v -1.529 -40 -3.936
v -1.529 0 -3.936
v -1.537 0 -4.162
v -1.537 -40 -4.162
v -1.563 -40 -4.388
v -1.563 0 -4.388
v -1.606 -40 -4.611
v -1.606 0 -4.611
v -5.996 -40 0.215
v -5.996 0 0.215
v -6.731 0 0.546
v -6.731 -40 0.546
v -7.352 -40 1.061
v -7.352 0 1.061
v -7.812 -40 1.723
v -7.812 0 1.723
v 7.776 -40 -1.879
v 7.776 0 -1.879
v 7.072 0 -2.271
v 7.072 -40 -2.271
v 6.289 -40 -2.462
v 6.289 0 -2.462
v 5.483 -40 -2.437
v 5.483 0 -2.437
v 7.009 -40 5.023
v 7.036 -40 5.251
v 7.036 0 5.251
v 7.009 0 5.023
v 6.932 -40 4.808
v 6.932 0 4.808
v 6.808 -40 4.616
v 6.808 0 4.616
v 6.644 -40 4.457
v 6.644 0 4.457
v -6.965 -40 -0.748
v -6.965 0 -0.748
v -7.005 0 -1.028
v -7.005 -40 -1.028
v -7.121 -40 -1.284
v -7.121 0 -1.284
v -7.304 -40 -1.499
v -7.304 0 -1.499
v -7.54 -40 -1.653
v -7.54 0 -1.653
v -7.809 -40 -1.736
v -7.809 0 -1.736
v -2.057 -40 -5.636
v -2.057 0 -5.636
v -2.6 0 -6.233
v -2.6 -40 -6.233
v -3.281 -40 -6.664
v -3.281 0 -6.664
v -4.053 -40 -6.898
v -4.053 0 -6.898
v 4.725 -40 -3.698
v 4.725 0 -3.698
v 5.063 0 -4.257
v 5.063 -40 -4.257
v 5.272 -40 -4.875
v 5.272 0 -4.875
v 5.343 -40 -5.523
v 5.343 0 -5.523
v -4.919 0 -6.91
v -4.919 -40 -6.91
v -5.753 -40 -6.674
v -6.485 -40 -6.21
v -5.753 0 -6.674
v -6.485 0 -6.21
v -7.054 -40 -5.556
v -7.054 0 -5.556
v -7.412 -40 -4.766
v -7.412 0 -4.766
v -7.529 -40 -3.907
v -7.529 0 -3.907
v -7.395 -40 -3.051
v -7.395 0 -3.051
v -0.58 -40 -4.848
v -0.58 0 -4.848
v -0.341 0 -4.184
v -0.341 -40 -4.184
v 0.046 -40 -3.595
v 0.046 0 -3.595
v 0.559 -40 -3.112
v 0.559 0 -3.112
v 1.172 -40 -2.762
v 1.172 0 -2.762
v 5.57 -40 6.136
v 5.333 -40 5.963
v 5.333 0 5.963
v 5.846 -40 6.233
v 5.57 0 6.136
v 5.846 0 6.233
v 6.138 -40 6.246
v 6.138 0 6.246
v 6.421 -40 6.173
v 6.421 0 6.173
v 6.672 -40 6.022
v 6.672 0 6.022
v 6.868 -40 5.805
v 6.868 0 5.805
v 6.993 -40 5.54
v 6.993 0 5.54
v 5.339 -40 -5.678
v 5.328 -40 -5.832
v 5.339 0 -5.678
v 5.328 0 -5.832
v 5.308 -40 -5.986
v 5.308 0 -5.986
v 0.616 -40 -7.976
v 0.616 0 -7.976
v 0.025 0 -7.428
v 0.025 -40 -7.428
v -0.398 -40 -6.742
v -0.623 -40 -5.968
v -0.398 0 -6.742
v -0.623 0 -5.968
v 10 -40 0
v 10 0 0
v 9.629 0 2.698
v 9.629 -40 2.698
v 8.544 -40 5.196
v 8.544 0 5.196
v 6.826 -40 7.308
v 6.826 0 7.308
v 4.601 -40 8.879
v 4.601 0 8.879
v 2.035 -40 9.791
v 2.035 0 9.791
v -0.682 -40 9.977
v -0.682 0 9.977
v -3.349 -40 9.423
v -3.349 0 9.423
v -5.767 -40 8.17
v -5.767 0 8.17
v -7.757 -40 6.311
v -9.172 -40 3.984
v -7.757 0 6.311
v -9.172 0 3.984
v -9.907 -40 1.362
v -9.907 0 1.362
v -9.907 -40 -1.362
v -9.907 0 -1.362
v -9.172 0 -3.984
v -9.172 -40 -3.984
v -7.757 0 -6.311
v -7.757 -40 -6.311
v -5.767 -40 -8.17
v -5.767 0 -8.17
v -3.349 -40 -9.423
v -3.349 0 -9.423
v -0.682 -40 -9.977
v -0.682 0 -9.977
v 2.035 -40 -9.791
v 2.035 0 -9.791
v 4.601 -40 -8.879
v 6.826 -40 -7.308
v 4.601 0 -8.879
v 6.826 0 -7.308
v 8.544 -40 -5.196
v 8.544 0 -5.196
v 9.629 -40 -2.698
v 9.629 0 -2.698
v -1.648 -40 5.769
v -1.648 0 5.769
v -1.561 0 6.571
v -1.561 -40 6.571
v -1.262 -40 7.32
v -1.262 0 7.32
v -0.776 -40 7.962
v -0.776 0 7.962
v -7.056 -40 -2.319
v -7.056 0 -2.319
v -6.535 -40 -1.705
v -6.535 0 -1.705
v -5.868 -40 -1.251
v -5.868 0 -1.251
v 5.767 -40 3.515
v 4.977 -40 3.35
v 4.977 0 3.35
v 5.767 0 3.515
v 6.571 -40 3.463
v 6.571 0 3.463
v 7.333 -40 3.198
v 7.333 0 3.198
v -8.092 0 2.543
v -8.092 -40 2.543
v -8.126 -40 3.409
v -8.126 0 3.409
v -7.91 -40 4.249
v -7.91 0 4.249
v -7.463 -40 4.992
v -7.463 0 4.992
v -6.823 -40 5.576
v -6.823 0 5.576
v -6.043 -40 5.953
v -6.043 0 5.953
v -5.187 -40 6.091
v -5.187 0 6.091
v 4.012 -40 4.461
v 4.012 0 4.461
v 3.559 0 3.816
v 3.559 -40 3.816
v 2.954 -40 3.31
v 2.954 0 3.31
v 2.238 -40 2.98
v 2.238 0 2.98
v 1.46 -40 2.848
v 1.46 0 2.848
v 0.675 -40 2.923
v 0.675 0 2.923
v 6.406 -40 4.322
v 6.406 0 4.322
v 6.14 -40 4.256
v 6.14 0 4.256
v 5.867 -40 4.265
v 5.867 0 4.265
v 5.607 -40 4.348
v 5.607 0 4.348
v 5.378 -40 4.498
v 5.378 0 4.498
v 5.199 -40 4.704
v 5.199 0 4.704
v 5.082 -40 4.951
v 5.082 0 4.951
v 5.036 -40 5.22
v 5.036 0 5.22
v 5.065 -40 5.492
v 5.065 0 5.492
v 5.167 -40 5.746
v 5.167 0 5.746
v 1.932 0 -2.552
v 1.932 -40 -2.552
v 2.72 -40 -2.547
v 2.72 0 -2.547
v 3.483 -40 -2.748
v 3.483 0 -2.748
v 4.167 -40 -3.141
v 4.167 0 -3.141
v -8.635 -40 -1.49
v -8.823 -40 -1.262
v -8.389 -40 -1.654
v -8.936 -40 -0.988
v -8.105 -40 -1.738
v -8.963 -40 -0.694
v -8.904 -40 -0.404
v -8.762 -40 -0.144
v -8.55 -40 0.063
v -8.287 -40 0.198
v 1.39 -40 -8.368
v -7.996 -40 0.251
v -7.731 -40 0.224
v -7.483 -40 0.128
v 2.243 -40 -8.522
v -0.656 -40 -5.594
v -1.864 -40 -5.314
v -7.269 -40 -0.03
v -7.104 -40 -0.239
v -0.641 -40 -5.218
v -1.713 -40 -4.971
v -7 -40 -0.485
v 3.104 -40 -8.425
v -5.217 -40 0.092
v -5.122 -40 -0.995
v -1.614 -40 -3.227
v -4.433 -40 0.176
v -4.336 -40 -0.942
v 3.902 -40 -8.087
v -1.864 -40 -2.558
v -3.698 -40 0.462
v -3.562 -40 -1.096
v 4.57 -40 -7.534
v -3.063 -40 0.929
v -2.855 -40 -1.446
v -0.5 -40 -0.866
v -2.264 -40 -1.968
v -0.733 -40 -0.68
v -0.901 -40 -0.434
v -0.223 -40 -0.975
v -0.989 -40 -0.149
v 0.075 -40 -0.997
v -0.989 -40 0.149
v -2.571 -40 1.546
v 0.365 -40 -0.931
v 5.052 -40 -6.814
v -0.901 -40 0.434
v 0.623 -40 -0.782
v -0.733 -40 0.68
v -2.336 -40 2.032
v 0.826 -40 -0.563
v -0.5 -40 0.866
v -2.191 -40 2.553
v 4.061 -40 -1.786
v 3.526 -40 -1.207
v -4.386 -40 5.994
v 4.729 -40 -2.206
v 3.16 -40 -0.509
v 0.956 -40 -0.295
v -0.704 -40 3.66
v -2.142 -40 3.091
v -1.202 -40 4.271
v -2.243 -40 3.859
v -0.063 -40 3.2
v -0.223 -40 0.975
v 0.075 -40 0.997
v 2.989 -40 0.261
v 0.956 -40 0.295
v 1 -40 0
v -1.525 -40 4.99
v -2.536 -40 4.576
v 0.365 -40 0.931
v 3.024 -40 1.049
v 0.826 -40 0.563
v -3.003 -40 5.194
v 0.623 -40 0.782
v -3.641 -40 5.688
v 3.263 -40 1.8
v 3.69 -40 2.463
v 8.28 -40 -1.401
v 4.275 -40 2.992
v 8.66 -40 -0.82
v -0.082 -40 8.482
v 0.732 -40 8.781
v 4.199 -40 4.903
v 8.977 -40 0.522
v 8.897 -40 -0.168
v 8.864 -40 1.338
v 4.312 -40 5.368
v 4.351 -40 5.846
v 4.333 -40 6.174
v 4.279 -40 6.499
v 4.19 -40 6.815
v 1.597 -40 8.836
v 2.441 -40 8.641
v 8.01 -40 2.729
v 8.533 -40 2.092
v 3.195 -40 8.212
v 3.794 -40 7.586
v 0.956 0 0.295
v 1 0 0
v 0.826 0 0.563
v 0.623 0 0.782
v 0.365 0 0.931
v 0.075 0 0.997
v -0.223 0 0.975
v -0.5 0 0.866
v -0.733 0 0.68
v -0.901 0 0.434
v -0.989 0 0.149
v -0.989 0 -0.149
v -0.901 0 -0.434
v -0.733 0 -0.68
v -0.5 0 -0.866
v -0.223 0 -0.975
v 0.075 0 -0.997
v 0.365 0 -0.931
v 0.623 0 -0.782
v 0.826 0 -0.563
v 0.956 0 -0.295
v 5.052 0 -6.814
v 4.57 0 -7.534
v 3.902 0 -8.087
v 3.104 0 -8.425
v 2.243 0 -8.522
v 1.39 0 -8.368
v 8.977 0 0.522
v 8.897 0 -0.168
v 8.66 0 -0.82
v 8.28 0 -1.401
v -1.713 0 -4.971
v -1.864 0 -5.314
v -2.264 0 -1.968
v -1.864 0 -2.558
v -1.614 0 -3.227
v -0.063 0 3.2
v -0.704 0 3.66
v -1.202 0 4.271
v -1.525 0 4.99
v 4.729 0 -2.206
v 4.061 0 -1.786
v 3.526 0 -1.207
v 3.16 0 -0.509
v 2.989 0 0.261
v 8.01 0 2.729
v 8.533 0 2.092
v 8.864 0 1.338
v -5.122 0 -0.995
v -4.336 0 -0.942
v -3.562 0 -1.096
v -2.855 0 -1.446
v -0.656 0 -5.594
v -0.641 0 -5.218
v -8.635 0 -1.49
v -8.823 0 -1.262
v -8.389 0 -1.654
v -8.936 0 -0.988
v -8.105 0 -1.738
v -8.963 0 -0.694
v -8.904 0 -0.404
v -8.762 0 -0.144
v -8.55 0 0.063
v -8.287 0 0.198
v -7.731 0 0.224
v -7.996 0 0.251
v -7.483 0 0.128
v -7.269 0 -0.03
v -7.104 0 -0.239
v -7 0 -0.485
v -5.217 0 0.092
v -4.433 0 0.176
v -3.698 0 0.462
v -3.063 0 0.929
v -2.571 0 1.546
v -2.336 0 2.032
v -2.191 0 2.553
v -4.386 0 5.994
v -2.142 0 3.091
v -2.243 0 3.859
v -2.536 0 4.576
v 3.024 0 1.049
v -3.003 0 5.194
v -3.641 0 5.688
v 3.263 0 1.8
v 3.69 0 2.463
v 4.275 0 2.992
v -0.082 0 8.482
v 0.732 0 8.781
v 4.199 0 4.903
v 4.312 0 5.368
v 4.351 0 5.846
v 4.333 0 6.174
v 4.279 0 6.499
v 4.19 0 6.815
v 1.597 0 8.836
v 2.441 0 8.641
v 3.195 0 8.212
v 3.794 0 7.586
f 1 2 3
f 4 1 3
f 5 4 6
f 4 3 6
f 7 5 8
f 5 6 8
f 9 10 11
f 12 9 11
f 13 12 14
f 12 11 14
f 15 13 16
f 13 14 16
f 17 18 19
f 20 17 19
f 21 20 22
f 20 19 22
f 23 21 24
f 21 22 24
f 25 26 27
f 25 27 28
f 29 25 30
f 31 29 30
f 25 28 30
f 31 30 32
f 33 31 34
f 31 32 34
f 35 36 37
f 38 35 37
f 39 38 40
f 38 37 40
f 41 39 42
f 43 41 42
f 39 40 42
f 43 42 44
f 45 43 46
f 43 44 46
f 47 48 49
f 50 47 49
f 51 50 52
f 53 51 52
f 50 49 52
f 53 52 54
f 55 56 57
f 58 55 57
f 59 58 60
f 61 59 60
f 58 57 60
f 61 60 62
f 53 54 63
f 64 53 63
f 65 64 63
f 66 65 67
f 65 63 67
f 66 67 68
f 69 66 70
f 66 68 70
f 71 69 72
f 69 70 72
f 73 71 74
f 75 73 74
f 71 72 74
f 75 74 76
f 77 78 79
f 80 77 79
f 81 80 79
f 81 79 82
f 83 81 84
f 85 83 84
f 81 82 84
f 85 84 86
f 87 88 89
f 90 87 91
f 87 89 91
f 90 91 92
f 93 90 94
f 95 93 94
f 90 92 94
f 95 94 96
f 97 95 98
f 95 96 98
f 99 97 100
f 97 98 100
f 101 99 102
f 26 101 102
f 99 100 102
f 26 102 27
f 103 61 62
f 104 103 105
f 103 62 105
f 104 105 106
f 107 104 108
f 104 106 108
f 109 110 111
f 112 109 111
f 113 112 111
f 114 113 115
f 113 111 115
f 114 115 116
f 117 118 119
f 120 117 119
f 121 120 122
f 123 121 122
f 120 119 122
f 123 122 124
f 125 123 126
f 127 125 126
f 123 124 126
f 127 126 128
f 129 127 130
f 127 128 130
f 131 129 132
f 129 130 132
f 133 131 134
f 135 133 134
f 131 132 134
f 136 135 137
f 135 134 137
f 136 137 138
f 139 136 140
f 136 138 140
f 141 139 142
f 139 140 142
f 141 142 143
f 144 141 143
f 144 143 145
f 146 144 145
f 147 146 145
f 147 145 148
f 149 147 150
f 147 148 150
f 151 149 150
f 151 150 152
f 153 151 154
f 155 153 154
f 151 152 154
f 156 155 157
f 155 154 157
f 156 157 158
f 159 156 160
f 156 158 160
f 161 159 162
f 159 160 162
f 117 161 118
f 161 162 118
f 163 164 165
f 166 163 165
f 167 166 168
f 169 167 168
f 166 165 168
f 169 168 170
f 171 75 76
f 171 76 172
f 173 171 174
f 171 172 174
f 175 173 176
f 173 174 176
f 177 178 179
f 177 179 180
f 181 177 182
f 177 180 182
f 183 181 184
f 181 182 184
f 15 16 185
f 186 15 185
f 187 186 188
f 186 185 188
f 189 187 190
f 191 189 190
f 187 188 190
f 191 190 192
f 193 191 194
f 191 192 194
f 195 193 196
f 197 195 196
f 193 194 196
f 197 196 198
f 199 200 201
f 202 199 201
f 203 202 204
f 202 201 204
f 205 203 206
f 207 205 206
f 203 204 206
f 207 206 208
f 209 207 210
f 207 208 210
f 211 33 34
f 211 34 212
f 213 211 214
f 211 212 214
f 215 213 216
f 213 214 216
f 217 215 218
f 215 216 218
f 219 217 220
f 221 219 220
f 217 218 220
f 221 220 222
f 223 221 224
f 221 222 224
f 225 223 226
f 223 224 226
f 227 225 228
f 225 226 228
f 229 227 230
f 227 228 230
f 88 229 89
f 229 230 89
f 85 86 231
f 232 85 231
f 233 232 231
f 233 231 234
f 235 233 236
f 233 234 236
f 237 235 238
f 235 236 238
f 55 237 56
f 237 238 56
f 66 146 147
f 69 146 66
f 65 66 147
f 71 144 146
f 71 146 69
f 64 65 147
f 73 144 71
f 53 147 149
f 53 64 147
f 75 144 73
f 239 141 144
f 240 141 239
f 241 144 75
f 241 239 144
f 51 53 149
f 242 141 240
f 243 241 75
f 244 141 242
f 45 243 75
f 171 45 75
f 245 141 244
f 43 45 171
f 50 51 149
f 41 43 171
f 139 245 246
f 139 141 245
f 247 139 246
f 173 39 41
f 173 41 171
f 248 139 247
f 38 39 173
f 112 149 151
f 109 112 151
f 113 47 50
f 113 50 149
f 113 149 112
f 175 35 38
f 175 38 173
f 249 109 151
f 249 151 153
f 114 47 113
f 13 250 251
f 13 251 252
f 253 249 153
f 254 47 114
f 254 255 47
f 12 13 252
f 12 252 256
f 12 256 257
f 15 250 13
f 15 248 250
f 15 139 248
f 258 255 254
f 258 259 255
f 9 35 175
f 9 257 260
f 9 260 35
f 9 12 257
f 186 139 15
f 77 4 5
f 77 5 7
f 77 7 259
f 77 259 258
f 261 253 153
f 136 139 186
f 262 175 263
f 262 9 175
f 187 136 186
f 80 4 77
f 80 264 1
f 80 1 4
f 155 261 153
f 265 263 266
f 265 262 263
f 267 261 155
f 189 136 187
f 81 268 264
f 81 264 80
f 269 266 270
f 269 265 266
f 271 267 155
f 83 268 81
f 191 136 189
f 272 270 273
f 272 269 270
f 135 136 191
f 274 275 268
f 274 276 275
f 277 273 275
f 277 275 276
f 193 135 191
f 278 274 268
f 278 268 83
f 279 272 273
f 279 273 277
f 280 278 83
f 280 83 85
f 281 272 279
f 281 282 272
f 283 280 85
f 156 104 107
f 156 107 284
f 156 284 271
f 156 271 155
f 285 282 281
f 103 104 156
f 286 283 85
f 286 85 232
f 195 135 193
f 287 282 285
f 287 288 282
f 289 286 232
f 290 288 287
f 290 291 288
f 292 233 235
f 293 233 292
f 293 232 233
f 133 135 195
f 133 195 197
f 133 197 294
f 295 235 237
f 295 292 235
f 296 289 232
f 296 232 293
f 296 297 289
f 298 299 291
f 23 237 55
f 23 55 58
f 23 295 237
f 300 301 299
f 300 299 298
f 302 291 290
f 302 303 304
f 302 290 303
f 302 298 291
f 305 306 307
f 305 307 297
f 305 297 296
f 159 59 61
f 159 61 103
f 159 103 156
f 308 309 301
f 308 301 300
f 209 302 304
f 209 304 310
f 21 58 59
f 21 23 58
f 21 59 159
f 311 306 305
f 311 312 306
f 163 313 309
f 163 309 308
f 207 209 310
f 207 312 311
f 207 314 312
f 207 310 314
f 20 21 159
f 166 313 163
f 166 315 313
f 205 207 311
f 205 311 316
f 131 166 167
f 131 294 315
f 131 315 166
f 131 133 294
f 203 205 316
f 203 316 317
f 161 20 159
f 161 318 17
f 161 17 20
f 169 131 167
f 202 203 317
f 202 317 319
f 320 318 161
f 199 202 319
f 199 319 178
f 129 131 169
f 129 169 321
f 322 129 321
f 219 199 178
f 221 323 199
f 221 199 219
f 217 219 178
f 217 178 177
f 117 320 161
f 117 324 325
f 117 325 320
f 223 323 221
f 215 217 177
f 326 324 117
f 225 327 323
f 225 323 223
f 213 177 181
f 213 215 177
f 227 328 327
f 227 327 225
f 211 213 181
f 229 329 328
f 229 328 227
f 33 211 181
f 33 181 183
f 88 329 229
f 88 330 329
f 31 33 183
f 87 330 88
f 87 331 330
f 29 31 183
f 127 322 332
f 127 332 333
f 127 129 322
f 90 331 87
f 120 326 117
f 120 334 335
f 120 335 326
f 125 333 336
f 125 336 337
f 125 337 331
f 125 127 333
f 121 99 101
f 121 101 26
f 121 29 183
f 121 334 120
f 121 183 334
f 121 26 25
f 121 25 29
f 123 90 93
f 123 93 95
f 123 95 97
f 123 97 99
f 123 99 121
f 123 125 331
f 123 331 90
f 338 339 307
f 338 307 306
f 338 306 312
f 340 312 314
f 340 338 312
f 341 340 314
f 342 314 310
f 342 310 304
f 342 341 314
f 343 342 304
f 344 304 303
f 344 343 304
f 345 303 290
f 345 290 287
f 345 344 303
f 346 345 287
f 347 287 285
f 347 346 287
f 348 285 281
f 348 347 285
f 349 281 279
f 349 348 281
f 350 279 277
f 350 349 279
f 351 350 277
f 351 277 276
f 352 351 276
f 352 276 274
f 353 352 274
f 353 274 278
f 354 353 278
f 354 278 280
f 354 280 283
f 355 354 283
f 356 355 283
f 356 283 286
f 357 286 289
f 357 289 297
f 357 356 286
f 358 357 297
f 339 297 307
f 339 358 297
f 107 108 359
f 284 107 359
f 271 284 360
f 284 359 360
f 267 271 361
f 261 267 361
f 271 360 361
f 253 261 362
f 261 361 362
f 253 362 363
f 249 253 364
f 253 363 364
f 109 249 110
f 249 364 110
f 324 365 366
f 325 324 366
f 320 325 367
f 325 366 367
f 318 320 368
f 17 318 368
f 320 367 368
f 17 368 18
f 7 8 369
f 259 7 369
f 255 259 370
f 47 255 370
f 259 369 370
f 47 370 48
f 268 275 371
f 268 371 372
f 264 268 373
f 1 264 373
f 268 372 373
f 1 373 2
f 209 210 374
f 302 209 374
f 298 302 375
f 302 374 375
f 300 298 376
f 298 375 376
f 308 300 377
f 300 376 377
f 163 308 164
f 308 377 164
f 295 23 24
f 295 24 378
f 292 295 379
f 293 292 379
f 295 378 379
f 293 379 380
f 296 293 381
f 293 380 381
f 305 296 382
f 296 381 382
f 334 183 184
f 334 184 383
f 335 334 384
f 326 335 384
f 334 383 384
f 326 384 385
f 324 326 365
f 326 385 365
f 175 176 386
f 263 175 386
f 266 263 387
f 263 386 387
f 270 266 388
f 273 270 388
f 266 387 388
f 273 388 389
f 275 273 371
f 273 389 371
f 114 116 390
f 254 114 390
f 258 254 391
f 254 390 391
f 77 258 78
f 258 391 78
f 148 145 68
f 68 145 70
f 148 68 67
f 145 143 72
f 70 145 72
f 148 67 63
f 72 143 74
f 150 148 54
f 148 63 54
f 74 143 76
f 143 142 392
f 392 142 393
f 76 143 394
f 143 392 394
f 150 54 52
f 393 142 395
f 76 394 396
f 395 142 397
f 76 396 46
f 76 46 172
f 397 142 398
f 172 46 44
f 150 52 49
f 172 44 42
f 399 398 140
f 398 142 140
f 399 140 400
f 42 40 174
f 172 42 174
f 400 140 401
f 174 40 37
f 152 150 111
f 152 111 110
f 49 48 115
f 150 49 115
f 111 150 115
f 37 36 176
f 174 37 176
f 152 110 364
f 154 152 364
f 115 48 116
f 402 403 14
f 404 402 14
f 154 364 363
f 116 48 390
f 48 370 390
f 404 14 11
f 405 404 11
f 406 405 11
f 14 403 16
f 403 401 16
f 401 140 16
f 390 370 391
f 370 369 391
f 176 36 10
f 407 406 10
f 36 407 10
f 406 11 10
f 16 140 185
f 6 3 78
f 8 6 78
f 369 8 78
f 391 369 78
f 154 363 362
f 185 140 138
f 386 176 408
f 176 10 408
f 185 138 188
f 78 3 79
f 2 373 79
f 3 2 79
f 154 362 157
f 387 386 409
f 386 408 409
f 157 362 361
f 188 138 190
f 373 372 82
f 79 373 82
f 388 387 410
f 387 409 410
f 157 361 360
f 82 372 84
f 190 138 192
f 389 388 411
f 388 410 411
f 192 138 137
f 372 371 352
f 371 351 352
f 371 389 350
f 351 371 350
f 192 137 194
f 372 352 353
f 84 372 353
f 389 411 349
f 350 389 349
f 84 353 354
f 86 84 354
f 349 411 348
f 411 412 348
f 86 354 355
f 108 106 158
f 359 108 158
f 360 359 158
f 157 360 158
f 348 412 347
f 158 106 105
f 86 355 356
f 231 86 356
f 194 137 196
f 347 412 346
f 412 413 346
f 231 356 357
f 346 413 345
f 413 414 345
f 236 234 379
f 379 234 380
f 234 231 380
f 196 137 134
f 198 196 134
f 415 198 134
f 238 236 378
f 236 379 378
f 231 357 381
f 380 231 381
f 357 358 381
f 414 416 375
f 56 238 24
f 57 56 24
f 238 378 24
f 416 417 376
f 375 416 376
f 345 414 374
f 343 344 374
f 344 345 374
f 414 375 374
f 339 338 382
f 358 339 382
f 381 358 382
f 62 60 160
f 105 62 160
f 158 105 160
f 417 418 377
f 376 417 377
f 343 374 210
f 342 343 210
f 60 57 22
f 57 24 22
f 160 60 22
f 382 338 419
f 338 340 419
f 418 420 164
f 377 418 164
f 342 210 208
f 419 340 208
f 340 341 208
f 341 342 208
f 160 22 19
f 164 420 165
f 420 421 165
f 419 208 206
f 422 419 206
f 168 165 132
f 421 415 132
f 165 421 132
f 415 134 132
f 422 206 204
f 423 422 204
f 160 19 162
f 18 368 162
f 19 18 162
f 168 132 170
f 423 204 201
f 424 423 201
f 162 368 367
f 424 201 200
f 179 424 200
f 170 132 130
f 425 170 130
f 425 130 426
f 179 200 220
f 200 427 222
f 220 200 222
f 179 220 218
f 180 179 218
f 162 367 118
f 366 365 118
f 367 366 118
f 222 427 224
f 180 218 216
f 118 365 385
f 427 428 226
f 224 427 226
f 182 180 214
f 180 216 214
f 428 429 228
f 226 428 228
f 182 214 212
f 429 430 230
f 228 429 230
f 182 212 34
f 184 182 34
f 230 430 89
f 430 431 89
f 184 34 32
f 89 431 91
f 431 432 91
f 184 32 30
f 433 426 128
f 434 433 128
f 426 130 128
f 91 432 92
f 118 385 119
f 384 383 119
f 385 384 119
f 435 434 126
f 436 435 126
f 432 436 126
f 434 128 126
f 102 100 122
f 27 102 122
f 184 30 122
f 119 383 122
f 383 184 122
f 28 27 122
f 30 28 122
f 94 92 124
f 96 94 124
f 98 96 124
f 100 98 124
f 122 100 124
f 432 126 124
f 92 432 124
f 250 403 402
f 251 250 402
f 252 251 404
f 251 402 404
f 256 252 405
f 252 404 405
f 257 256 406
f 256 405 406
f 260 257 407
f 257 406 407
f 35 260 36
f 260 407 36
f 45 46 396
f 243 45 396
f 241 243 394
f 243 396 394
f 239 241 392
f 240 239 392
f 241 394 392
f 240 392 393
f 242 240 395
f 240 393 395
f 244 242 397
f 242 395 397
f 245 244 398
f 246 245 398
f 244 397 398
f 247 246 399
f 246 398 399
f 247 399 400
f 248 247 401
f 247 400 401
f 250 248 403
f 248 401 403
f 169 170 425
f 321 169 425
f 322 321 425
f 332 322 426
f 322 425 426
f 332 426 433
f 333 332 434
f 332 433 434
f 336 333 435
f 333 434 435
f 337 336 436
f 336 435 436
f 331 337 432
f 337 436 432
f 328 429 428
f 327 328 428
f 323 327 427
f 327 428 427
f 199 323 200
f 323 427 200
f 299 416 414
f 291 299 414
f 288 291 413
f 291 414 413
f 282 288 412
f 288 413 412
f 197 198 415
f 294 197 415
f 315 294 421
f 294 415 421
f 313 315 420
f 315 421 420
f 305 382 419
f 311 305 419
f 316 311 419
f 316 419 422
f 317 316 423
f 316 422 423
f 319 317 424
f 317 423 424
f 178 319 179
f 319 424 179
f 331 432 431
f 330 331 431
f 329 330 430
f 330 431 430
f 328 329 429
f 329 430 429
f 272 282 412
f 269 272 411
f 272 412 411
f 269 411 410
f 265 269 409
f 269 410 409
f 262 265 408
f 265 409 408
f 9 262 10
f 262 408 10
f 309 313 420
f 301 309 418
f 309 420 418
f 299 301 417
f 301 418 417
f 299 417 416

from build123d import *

# Parameters (mm, degrees)
F0_R     = 10
F0_R_2   = 1
F1_DEPTH = 40


with BuildPart() as f1:
    # F0 (on Front) → F1 (new body)
    with BuildSketch(Plane.XZ):
        Circle(F0_R)
        with BuildLine():
            ThreePointArc((6.6435448727, 4.4568275179), (7.0165111824, 3.8429898293), (7.3329177707, 3.1981740052))
            ThreePointArc((7.3329177707, 3.1981740052), (8.5333245383, 2.0924606947), (8.9772542605, 0.5219497159))
            ThreePointArc((8.9772542605, 0.5219497159), (8.6602558801, -0.8202508315), (7.776252721, -1.8788011123))
            ThreePointArc((7.776252721, -1.8788011123), (6.8566594958, -4.1214342842), (5.3076404374, -5.9857291107))
            ThreePointArc((5.3076404374, -5.9857291107), (3.5152152369, -8.2851229223), (0.6161482026, -7.9762372954))
            ThreePointArc((0.6161482026, -7.9762372954), (-1.8008926237, -7.7946639285), (-4.0526155804, -6.8975580431))
            ThreePointArc((-4.0526155804, -6.8975580431), (-6.7933588965, -5.9034121407), (-7.3954521896, -3.0507846385))
            ThreePointArc((-7.3954521896, -3.0507846385), (-7.630756176, -2.4024071642), (-7.8093348718, -1.7361707463))
            ThreePointArc((-7.8093348718, -1.7361707463), (-8.9605366896, -0.8418920566), (-7.9960562334, 0.251166702))
            ThreePointArc((-7.9960562334, 0.251166702), (-7.9383510901, 0.9912527276), (-7.8122946094, 1.7228038007))
            ThreePointArc((-7.8122946094, 1.7228038007), (-7.7137419327, 4.6366135697), (-5.186789018, 6.0907486964))
            ThreePointArc((-5.186789018, 6.0907486964), (-3.1246357662, 7.3645537087), (-0.7756480184, 7.9623093479))
            ThreePointArc((-0.7756480184, 7.9623093479), (2.0260042016, 8.7689969195), (4.189840284, 6.8150743499))
            ThreePointArc((4.189840284, 6.8150743499), (4.7806533049, 6.4144644343), (5.3334042334, 5.9627845243))
            ThreePointArc((5.3334042334, 5.9627845243), (6.4214881928, 6.1733853396), (7.035627896, 5.2508281158))
            ThreePointArc((7.035627896, 5.2508281158), (6.9322652186, 4.8080623632), (6.6435448727, 4.4568275179))
        make_face(mode=Mode.SUBTRACT)
        with BuildLine():
            ThreePointArc((-2.5712473173, 1.5455378459), (-1.1717384371, 2.7617076302), (0.6753346935, 2.9229989825))
            ThreePointArc((0.6753346935, 2.9229989825), (-0.9731935316, 3.9487207499), (-1.6483458018, 5.7691382474))
            ThreePointArc((-1.6483458018, 5.7691382474), (-2.3434768246, 5.5234152815), (-3.0032221992, 5.1942907526))
            ThreePointArc((-3.0032221992, 5.1942907526), (-2.3660024763, 4.2273377279), (-2.1424946218, 3.0910757132))
            ThreePointArc((-2.1424946218, 3.0910757132), (-2.2516693146, 2.2891224456), (-2.5712473173, 1.5455378459))
        make_face()
        with BuildLine():
            ThreePointArc((0.6753346935, 2.9229989825), (2.2644529469, 1.9678040683), (2.9886271289, 0.2609748731))
            ThreePointArc((2.9886271289, 0.2609748731), (3.454723253, 2.1457838566), (4.9774096583, 3.3504317772))
            ThreePointArc((4.9774096583, 3.3504317772), (4.528905931, 3.9356080938), (4.0120173703, 4.4613581587))
            ThreePointArc((4.0120173703, 4.4613581587), (2.6067344642, 3.1216079734), (0.6753346935, 2.9229989825))
        make_face()
        with BuildLine():
            ThreePointArc((2.9886271289, 0.2609748731), (2.9971554336, 0.1306112807), (3, 0))
            ThreePointArc((3, 0), (2.5015210631, -1.6560170201), (1.1717384193, -2.7617076378))
            ThreePointArc((1.1717384193, -2.7617076378), (3.1083299118, -2.6225533829), (4.7245541465, -3.6984575321))
            ThreePointArc((4.7245541465, -3.6984575321), (5.1424946218, -3.0910757132), (5.4827852975, -2.4370197745))
            ThreePointArc((5.4827852975, -2.4370197745), (3.7743508626, -1.5145218945), (2.9886271289, 0.2609748731))
        make_face()
        with BuildLine():
            ThreePointArc((-0.5795221486, -4.8480805477), (0.0456612251, -3.5946738602), (1.1717384193, -2.7617076378))
            ThreePointArc((1.1717384193, -2.7617076378), (-0.675334733, -2.9229989734), (-2.2644529693, -1.9678040425))
            ThreePointArc((-2.2644529693, -1.9678040425), (-1.7188028292, -2.8852174249), (-1.528905931, -3.9356080938))
            ThreePointArc((-1.528905931, -3.9356080938), (-1.5482183493, -4.2754632692), (-1.6059069578, -4.6109428277))
            Line((-1.6059069578, -4.6109428277), (-0.5795221486, -4.8480805477))
        make_face()
        with BuildLine():
            ThreePointArc((-0.6234697034, -5.9675192106), (-0.654213992, -5.4057302436), (-0.5795221486, -4.8480805477))
            Line((-0.5795221486, -4.8480805477), (-1.6059069578, -4.6109428277))
            ThreePointArc((-1.6059069578, -4.6109428277), (-1.783407838, -5.1448393461), (-2.057474614, -5.636204238))
            ThreePointArc((-2.057474614, -5.636204238), (-1.3506694677, -5.8459979464), (-0.6234697034, -5.9675192106))
        make_face()
        with BuildLine():
            ThreePointArc((0.6161482026, -7.9762372954), (-0.2095198229, -7.0989177785), (-0.6234697034, -5.9675192106))
            ThreePointArc((-0.6234697034, -5.9675192106), (-1.3506694677, -5.8459979464), (-2.057474614, -5.636204238))
            ThreePointArc((-2.057474614, -5.636204238), (-2.9257780157, -6.4713487918), (-4.0526155804, -6.8975580431))
            ThreePointArc((-4.0526155804, -6.8975580431), (-1.8008926237, -7.7946639285), (0.6161482026, -7.9762372954))
        make_face()
        with BuildLine():
            ThreePointArc((-5.8681107652, -1.2511099262), (-3.9437276347, -0.993233821), (-2.2644529693, -1.9678040425))
            ThreePointArc((-2.2644529693, -1.9678040425), (-2.9886271299, -0.2609748613), (-2.5712473173, 1.5455378459))
            ThreePointArc((-2.5712473173, 1.5455378459), (-4.0561899268, 0.2946597731), (-5.996143389, 0.2150917455))
            ThreePointArc((-5.996143389, 0.2150917455), (-5.9772542605, -0.5219497159), (-5.8681107652, -1.2511099262))
        make_face()
        with BuildLine():
            ThreePointArc((-7.3954521896, -3.0507846385), (-6.8162171978, -1.9944210424), (-5.8681107652, -1.2511099262))
            ThreePointArc((-5.8681107652, -1.2511099262), (-5.9772542605, -0.5219497159), (-5.996143389, 0.2150917455))
            ThreePointArc((-5.996143389, 0.2150917455), (-7.0587335663, 0.7828234939), (-7.8122946094, 1.7228038007))
            ThreePointArc((-7.8122946094, 1.7228038007), (-7.9383510901, 0.9912527276), (-7.9960562334, 0.251166702))
            ThreePointArc((-7.9960562334, 0.251166702), (-7.2689095521, -0.0303182964), (-6.9649215018, -0.7483484948))
            ThreePointArc((-6.9649215018, -0.7483484948), (-7.2047943315, -1.3981228287), (-7.8093348718, -1.7361707463))
            ThreePointArc((-7.8093348718, -1.7361707463), (-7.630756176, -2.4024071642), (-7.3954521896, -3.0507846385))
        make_face()
        with BuildLine():
            ThreePointArc((7.776252721, -1.8788011123), (6.686726826, -2.3929514281), (5.4827852975, -2.4370197745))
            ThreePointArc((5.4827852975, -2.4370197745), (5.1424946218, -3.0910757132), (4.7245541465, -3.6984575321))
            ThreePointArc((4.7245541465, -3.6984575321), (5.1845357791, -4.5598884178), (5.3434768246, -5.5234152815))
            ThreePointArc((5.3434768246, -5.5234152815), (5.3345043101, -5.755265623), (5.3076404374, -5.9857291107))
            ThreePointArc((5.3076404374, -5.9857291107), (6.8566594958, -4.1214342842), (7.776252721, -1.8788011123))
        make_face()
        with BuildLine():
            ThreePointArc((4.0120173703, 4.4613581587), (4.528905931, 3.9356080938), (4.9774096583, 3.3504317772))
            ThreePointArc((4.9774096583, 3.3504317772), (6.1707675187, 3.51570198), (7.3329177707, 3.1981740052))
            ThreePointArc((7.3329177707, 3.1981740052), (7.0165111824, 3.8429898293), (6.6435448727, 4.4568275179))
            ThreePointArc((6.6435448727, 4.4568275179), (5.281174409, 4.5944746013), (5.3334042334, 5.9627845243))
            ThreePointArc((5.3334042334, 5.9627845243), (4.7806533049, 6.4144644343), (4.189840284, 6.8150743499))
            ThreePointArc((4.189840284, 6.8150743499), (4.3101890613, 6.3371636776), (4.3506694677, 5.8459979464))
            ThreePointArc((4.3506694677, 5.8459979464), (4.2647768532, 5.1332720901), (4.0120173703, 4.4613581587))
        make_face()
        with BuildLine():
            ThreePointArc((1.1717384193, -2.7617076378), (2.5015210631, -1.6560170201), (3, 0))
            ThreePointArc((3, 0), (2.9971554336, 0.1306112807), (2.9886271289, 0.2609748731))
            ThreePointArc((2.9886271289, 0.2609748731), (2.2644529469, 1.9678040683), (0.6753346935, 2.9229989825))
            ThreePointArc((0.6753346935, 2.9229989825), (-1.1717384371, 2.7617076302), (-2.5712473173, 1.5455378459))
            ThreePointArc((-2.5712473173, 1.5455378459), (-2.9886271299, -0.2609748613), (-2.2644529693, -1.9678040425))
            ThreePointArc((-2.2644529693, -1.9678040425), (-0.675334733, -2.9229989734), (1.1717384193, -2.7617076378))
        make_face()
        Circle(F0_R_2, mode=Mode.SUBTRACT)
        with BuildLine():
            ThreePointArc((-3.0032221992, 5.1942907526), (-2.3434768246, 5.5234152815), (-1.6483458018, 5.7691382474))
            ThreePointArc((-1.6483458018, 5.7691382474), (-1.4367592458, 6.9551603182), (-0.7756480184, 7.9623093479))
            ThreePointArc((-0.7756480184, 7.9623093479), (-3.1246357662, 7.3645537087), (-5.186789018, 6.0907486964))
            ThreePointArc((-5.186789018, 6.0907486964), (-4.0031340801, 5.8662977864), (-3.0032221992, 5.1942907526))
        make_face()
    extrude(amount=F1_DEPTH)


solid = f1.part
